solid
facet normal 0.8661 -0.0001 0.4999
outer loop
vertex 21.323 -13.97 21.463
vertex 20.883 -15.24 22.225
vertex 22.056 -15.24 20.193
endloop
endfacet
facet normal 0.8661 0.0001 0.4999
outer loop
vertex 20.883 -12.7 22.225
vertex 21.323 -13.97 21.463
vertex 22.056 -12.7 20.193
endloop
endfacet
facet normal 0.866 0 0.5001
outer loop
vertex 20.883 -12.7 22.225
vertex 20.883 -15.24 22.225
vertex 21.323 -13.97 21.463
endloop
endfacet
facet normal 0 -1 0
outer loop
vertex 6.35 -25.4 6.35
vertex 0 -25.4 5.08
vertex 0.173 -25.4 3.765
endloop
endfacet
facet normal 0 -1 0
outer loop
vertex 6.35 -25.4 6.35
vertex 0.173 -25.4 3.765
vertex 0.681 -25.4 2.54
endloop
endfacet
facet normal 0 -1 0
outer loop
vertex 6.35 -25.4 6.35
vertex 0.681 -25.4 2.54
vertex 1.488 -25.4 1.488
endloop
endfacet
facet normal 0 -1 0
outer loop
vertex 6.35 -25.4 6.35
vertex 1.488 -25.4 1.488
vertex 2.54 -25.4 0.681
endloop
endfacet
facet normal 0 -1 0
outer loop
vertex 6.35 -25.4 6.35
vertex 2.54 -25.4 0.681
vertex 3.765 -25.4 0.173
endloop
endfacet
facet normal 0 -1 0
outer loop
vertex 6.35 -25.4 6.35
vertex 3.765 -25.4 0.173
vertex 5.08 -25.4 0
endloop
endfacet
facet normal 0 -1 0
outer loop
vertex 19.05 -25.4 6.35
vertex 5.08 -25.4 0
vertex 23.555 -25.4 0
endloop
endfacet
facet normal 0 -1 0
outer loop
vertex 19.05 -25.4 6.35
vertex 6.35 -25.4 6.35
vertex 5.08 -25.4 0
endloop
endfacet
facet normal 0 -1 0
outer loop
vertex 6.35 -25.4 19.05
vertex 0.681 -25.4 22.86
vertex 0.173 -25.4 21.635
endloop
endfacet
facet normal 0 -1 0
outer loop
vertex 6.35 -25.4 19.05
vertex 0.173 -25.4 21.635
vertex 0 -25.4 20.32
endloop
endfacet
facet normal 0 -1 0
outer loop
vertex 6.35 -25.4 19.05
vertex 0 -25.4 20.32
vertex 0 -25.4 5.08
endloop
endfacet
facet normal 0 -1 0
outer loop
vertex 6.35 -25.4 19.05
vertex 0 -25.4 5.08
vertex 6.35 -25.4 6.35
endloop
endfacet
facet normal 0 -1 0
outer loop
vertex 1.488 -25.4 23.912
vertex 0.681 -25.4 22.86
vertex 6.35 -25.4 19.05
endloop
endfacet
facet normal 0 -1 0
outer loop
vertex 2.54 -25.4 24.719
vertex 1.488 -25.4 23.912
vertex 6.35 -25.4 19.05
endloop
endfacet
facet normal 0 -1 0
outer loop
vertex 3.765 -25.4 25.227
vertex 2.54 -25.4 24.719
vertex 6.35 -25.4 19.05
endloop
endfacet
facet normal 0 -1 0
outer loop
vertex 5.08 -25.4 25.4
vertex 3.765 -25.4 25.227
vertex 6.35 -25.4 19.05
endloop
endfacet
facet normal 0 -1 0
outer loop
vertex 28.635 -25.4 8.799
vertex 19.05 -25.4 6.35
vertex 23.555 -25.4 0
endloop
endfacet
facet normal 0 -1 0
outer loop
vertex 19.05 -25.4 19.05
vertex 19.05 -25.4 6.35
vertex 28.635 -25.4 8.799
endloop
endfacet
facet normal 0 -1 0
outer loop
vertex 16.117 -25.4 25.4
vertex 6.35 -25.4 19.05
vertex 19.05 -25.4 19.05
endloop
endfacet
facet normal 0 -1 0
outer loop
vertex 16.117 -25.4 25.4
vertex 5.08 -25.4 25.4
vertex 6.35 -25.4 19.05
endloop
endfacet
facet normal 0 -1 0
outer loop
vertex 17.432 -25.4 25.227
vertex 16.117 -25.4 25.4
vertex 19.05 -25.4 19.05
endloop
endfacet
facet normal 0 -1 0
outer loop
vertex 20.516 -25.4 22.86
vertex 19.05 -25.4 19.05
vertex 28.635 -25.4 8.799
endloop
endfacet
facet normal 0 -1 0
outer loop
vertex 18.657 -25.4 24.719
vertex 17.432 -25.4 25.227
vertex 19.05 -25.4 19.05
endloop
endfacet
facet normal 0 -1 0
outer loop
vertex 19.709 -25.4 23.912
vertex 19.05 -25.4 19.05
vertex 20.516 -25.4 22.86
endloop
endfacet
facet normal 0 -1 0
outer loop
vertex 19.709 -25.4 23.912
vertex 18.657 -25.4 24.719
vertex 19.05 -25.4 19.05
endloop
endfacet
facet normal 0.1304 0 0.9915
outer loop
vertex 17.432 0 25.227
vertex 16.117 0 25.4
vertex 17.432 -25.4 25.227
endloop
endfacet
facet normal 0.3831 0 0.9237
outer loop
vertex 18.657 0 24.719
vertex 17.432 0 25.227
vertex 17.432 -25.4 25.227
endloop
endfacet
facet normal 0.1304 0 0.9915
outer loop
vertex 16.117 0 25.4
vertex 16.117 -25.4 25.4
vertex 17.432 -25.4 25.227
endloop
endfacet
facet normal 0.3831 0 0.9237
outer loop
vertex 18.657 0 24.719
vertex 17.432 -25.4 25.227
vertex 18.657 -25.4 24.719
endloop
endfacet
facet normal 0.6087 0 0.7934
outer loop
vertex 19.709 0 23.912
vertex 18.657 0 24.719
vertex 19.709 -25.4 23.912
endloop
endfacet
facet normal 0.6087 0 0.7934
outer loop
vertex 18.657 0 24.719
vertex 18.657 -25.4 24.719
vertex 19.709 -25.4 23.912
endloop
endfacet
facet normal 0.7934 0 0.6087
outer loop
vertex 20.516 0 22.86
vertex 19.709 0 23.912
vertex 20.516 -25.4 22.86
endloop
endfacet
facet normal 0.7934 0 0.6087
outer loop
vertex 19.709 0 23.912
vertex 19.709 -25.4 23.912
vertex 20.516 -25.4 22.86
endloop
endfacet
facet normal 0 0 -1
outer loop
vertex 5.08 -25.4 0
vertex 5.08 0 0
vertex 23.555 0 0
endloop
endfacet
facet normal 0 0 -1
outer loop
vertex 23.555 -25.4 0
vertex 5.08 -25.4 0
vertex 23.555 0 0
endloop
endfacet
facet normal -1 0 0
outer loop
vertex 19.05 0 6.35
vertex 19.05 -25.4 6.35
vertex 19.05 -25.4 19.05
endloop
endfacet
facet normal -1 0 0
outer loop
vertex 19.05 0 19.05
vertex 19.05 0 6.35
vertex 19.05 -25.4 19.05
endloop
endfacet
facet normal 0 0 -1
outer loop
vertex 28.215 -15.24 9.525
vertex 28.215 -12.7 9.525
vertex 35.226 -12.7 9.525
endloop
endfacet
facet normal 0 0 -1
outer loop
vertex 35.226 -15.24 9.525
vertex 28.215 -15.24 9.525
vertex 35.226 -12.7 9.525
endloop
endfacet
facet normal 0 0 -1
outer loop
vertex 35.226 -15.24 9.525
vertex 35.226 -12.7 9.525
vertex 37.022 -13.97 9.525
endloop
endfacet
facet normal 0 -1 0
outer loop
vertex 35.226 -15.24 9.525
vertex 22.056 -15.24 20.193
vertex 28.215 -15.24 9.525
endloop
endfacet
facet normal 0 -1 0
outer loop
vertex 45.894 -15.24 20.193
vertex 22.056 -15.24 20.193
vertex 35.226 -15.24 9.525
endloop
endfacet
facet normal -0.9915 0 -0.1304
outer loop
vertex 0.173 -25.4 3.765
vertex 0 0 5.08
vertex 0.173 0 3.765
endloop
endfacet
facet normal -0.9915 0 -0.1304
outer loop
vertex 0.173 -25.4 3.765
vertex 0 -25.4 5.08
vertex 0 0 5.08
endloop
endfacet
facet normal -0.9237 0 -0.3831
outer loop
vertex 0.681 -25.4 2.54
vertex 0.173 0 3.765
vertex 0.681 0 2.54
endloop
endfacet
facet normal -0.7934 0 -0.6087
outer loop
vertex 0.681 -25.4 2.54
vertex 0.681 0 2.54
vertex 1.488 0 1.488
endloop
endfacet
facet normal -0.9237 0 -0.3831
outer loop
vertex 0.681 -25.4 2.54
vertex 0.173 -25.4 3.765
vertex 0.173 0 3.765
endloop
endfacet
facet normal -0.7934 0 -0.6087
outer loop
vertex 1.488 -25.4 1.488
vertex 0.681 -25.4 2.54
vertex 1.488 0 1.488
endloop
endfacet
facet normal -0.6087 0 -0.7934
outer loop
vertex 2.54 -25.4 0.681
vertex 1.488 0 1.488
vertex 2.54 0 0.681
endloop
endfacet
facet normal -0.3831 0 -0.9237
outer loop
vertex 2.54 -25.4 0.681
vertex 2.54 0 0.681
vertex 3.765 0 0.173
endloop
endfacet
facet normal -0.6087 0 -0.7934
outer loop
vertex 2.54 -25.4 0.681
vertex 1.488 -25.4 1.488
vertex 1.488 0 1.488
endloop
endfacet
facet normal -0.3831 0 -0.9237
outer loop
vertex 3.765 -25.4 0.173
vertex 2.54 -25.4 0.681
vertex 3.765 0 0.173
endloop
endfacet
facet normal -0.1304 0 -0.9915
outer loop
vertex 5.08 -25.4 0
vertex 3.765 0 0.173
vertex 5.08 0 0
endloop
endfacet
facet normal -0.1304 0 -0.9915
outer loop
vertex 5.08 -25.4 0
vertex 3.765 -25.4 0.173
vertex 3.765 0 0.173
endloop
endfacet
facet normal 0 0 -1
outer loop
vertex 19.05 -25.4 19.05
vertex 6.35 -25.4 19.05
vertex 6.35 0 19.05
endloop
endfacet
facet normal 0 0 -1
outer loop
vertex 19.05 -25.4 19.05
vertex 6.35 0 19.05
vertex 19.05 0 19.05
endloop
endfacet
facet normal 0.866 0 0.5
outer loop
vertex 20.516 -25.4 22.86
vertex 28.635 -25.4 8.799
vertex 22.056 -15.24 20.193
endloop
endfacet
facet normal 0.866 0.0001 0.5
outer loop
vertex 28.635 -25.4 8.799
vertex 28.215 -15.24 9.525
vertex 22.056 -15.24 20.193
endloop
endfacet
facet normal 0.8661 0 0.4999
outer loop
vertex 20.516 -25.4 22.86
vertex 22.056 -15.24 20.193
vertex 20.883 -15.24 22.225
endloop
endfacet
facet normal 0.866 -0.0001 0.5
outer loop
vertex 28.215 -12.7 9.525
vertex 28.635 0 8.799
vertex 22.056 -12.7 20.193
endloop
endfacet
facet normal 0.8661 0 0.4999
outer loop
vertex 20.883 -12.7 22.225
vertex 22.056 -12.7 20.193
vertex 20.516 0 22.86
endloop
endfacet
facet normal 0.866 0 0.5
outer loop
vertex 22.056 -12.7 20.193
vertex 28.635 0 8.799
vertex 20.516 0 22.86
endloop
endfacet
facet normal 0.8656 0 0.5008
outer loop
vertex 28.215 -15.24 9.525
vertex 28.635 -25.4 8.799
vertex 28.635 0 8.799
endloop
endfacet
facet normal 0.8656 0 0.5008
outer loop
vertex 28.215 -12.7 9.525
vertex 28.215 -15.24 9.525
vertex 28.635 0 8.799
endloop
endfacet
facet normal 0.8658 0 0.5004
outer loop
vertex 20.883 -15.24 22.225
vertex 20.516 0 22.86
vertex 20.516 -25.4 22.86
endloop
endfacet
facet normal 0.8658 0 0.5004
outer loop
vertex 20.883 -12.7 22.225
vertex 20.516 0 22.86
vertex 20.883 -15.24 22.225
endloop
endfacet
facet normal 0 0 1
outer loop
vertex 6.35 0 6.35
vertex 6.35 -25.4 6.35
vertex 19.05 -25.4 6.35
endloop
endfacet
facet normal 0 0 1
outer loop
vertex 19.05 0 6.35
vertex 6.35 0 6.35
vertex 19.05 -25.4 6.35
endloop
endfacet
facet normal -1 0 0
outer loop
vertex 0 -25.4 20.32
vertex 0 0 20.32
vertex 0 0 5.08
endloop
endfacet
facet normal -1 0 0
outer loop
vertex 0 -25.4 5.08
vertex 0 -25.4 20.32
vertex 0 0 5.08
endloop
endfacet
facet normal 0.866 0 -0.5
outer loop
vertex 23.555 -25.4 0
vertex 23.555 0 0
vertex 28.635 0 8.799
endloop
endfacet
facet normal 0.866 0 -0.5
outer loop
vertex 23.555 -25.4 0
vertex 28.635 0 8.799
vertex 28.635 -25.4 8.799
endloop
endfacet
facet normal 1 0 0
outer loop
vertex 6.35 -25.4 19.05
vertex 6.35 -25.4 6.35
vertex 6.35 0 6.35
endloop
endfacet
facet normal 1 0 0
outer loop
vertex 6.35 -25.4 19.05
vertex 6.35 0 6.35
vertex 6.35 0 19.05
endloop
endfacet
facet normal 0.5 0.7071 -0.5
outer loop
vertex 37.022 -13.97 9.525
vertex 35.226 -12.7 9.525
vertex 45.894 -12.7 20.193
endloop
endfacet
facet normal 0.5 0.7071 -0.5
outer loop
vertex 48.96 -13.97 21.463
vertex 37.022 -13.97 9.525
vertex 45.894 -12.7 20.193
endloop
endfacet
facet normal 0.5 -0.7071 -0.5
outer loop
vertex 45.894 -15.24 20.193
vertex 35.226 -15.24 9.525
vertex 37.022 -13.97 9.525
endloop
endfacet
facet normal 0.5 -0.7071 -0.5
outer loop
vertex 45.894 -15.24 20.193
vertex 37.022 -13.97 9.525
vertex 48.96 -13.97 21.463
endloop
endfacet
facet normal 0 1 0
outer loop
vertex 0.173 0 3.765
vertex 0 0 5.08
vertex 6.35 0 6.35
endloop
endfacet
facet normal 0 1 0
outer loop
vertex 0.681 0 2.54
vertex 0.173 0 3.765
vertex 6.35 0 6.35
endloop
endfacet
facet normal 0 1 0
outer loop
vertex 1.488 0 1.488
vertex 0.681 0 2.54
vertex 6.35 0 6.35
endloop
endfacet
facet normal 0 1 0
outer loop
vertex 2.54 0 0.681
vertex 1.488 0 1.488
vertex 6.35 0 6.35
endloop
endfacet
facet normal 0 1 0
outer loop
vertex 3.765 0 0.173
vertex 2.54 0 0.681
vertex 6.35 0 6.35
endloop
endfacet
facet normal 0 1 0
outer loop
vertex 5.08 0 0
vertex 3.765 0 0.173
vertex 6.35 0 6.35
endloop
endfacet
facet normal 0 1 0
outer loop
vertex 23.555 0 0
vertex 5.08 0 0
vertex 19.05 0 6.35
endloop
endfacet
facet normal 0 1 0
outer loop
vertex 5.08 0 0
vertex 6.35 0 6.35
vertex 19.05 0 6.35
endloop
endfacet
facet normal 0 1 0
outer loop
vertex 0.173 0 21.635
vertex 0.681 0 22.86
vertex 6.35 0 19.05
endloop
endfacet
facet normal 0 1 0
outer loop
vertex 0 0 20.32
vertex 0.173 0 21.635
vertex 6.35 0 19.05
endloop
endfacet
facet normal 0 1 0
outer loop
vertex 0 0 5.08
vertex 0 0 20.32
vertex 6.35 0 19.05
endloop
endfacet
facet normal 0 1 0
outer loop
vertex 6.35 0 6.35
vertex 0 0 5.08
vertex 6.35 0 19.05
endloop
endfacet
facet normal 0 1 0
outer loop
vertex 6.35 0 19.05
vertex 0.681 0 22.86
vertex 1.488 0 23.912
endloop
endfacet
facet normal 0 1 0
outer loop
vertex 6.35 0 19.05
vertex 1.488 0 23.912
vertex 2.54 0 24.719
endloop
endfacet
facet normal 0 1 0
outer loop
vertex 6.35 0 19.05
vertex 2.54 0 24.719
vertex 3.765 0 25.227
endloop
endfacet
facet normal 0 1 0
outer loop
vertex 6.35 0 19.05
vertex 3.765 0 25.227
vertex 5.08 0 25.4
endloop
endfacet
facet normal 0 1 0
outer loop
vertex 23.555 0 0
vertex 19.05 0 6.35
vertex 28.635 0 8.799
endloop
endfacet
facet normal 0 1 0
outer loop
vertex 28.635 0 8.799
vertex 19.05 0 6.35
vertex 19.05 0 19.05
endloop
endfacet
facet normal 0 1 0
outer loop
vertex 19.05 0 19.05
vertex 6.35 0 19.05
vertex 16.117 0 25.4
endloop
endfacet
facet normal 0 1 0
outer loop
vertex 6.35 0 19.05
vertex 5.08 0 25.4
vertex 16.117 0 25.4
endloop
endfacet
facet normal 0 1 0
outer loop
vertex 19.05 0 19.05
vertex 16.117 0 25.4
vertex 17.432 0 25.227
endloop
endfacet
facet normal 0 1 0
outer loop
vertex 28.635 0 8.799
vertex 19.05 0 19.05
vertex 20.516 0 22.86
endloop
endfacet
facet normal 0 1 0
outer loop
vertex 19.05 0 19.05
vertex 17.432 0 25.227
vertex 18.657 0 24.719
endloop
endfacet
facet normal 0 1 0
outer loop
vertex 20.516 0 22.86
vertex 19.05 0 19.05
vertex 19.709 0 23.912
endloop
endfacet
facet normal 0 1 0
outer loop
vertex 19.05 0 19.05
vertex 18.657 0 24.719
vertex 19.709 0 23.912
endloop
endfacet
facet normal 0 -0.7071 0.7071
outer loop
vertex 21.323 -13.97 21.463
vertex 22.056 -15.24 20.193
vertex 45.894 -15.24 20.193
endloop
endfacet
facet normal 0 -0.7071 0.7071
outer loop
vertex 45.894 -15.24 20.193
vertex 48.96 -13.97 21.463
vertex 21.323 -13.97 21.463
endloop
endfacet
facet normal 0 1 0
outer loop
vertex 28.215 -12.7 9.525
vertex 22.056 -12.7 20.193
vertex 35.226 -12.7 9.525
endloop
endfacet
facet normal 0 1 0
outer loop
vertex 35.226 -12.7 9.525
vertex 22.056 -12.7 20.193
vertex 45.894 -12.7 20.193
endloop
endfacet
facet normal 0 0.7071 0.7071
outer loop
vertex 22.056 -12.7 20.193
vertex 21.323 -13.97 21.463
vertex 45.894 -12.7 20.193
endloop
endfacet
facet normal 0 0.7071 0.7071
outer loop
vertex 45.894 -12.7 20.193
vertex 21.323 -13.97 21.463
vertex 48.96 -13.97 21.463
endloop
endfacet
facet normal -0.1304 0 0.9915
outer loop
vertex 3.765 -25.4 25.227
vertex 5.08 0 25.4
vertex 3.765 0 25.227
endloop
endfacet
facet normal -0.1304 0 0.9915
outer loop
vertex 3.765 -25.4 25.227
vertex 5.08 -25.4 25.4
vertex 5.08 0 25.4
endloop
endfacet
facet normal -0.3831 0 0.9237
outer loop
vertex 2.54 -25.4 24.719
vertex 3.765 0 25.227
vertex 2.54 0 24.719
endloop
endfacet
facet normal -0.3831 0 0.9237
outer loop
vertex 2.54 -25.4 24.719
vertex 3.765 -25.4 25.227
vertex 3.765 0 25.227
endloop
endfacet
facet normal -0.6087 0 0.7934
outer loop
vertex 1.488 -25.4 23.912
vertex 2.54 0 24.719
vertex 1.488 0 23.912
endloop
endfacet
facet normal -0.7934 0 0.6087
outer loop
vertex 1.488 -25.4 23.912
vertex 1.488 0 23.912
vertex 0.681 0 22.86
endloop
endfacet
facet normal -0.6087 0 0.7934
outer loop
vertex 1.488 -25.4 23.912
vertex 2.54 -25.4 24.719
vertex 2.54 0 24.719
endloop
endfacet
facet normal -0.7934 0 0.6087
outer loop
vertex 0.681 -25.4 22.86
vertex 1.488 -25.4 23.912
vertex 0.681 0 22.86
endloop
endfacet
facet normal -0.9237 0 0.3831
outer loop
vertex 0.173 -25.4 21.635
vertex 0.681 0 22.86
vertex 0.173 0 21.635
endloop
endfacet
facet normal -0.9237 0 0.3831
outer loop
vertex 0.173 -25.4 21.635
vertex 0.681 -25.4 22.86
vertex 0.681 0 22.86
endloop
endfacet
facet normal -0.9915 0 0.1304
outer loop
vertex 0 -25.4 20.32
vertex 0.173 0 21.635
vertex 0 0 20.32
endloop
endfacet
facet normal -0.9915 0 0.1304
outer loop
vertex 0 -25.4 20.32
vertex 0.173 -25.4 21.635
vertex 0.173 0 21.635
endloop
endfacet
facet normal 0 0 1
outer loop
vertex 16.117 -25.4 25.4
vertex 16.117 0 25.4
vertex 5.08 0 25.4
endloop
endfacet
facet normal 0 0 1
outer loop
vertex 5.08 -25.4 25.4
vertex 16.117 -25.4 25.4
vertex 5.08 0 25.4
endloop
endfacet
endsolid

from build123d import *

# Parameters (mm, degrees)
F0_W        = 12.7
F0_H        = 12.7
F1_DEPTH    = 25.4
F4_DEPTH    = 2.54
F5_R        = 5.08
F6_SIZE     = 10.16
F7_T4_DEPTH = 40.3682325584
F7_T9_DEPTH = 40.3682325584
F8_T1_DEPTH = 25.5381499465


# Not quite as in the source:
# - a fillet or chamfer that OpenCascade refuses, or shapes differently, is made with other operations: its cross-section is extruded or revolved along the edge and cut away or added
# - a feature names something its author has since deleted; it is built from what else it names


with BuildPart() as f1:
    # F0 (on Front) → F1 (new body)
    with BuildSketch(Plane.XZ):
        Polygon((19.05, 25.4), (0, 25.4), (0, 0), (33.7146968374, 0), align=None)
        with Locations((12.7, 12.7)):
            Rectangle(F0_W, F0_H, mode=Mode.SUBTRACT)
    extrude(amount=F1_DEPTH)

    # F3 (on mid) → F4 (join)
    with BuildSketch(Plane.XZ.offset(12.7)):
        Polygon((50.8, 22.225), (20.8830871047, 22.225), (28.2154355234, 9.525), (38.1, 9.525), align=None)
    extrude(amount=F4_DEPTH)

    # F5
    f5_edges = [f1.edges().sort_by_distance(p)[0] for p in [
        (0, -12.7, 0),
        (0, -12.7, 25.4),
        (19.05, -12.7, 25.4),
    ]]
    fillet(f5_edges, radius=F5_R)

    # F6
    f6_edges = [f1.edges().sort_by_distance(p)[0] for p in [
        (33.714697, -12.7, 0),
    ]]
    chamfer(f6_edges, length=F6_SIZE)

    # F7: chamfer of 2.032 on 2 edges, made by hand


with BuildPart() as f7_tool2:
    # F7_s3 → F7_t4 (new body)
    with BuildSketch(Plane.YZ.offset(56.0256598315)):
        Polygon((-14.732, 22.225), (-12.7, 20.193), (-12.7, 22.225), align=None)
    extrude(amount=-F7_T4_DEPTH)

    split(bisect_by=Plane(origin=(25.2860226281, 0, 14.598891971), x_dir=(0, 1, 0), z_dir=(0.8660254038, 0, 0.5)), keep=Keep.TOP)


with BuildPart() as f1_1:
    add(f1.part)

    # F7_t1: cut F7_tool2
    add(f7_tool2.part, mode=Mode.SUBTRACT)


with BuildPart() as f7_tool7:
    # F7_s8 → F7_t9 (new body)
    with BuildSketch(Plane.YZ.offset(56.0256598315)):
        Polygon((-15.24, 20.193), (-13.208, 22.225), (-15.24, 22.225), align=None)
    extrude(amount=-F7_T9_DEPTH)

    split(bisect_by=Plane(origin=(25.2860226281, 0, 14.598891971), x_dir=(0, 1, 0), z_dir=(0.8660254038, 0, 0.5)), keep=Keep.TOP)


with BuildPart() as f1_2:
    add(f1_1.part)

    # F7_t6: cut F7_tool7
    add(f7_tool7.part, mode=Mode.SUBTRACT)

    # F8: chamfer of 2.032 on 2 edges, made by hand

    # F8_s2 → F8_t1 (cut)
    with BuildSketch(Plane(origin=(20.1174004969, 0, 20.1174004969), x_dir=(0, 1, 0), z_dir=(0.7071067812, 0, 0.7071067812))):
        Polygon((-12.7, -18.1735762724), (-14.732, -20.2055762724), (-12.7, -20.2055762724), align=None)
        Polygon((-15.24, -18.1735762724), (-13.208, -20.2055762724), (-15.24, -20.2055762724), align=None)
    extrude(amount=F8_T1_DEPTH, mode=Mode.SUBTRACT)


solid = f1_2.part
